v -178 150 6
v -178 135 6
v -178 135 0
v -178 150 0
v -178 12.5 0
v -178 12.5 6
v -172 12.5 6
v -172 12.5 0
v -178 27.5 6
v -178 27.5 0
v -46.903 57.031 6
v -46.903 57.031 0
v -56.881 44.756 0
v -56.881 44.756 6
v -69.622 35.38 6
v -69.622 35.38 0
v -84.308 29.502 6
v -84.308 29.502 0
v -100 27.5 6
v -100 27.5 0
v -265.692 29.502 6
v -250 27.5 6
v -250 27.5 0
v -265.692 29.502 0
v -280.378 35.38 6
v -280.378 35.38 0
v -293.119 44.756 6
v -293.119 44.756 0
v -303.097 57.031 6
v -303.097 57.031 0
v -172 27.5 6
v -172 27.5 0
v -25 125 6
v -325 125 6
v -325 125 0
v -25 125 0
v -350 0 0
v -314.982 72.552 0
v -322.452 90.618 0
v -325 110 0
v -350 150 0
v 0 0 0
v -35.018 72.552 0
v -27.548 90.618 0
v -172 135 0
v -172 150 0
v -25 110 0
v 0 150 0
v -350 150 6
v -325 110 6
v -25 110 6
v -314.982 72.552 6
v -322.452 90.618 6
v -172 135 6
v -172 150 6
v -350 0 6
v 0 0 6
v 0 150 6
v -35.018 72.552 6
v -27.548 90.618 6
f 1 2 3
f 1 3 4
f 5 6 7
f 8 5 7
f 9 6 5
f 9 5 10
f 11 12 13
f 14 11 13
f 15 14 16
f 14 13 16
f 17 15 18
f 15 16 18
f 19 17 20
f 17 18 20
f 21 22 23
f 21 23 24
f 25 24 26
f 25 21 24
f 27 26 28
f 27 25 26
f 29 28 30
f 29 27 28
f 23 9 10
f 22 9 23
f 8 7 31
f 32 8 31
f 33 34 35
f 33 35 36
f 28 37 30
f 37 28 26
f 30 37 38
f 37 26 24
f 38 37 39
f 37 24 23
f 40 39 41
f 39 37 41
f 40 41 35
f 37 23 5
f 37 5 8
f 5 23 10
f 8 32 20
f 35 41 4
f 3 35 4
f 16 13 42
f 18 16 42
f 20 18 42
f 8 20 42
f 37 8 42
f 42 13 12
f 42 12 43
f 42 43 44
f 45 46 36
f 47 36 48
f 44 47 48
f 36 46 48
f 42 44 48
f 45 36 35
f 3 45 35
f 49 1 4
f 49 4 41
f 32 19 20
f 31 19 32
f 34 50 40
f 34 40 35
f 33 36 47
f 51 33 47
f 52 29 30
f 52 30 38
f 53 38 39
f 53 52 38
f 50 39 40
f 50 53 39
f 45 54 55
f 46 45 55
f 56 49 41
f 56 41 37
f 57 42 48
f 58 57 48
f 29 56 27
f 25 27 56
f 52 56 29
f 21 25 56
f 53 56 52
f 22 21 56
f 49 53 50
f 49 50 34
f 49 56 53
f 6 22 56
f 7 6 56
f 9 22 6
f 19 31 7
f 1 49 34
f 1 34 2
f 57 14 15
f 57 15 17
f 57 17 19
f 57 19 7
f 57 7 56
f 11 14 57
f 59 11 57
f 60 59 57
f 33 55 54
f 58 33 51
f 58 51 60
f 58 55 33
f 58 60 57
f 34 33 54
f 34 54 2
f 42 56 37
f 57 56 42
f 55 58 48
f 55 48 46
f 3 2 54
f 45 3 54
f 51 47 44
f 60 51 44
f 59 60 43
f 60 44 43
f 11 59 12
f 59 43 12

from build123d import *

# Parameters (mm, degrees)
SKETCH1_W           = 200
SKETCH1_H           = 150
BOSS_EXTRUDE1_DEPTH = 6
SKETCH3_W           = 100
SKETCH3_H           = 97.5
CUT_EXTRUDE1_DEPTH  = 6
BOSS_EXTRUDE3_DEPTH = 6
SKETCH5_W           = 6
SKETCH5_H           = 15
CUT_EXTRUDE2_DEPTH  = 6


with BuildPart() as part:
    # Sketch1 → Boss-Extrude1 (new body)
    with BuildSketch(Plane.XY):
        with Locations((-100, 75)):
            Rectangle(SKETCH1_W, SKETCH1_H)
        with BuildLine():
            Line((-175, 110), (-175, 125))
            Line((-175, 125), (-25, 125))
            Line((-25, 125), (-25, 110))
            ThreePointArc((-25, 110), (-30.691670032, 81.340701386), (-46.902810588, 57.03125))
            ThreePointArc((-46.902810588, 57.03125), (-100, 27.5), (-153.097189412, 57.03125))
            ThreePointArc((-153.097189412, 57.03125), (-169.308329968, 81.340701386), (-175, 110))
        make_face(mode=Mode.SUBTRACT)
    extrude(amount=BOSS_EXTRUDE1_DEPTH)

    # Sketch3 → Cut-Extrude1 (cut)
    with BuildSketch(Plane.XY.offset(6)):
        with Locations((-150, 76.25)):
            Rectangle(SKETCH3_W, SKETCH3_H)
    extrude(amount=-CUT_EXTRUDE1_DEPTH, mode=Mode.SUBTRACT)

    # Sketch4 → Boss-Extrude3 (add)
    with BuildSketch(Plane.XY.offset(6)):
        with BuildLine():
            Line((-200, 27.5), (-250, 27.5))
            ThreePointArc((-250, 27.5), (-280.378472024, 35.379505335), (-303.097189412, 57.03125))
            ThreePointArc((-303.097189412, 57.03125), (-319.308329968, 81.340701386), (-325, 110))
            Line((-325, 110), (-325, 125))
            Line((-325, 125), (-200, 125))
            Line((-200, 125), (-200, 150))
            Line((-200, 150), (-350, 150))
            Line((-350, 150), (-350, 0))
            Line((-350, 0), (-200, 0))
            Line((-200, 0), (-200, 27.5))
        make_face()
    extrude(amount=-BOSS_EXTRUDE3_DEPTH)

    # Sketch5 → Cut-Extrude2 (cut)
    with BuildSketch(Plane.XY.offset(6)):
        with Locations((-175, 142.5)):
            Rectangle(SKETCH5_W, SKETCH5_H)
        with Locations((-175, 20)):
            Rectangle(SKETCH5_W, SKETCH5_H)
    extrude(amount=-CUT_EXTRUDE2_DEPTH, mode=Mode.SUBTRACT)


solid = part.part
